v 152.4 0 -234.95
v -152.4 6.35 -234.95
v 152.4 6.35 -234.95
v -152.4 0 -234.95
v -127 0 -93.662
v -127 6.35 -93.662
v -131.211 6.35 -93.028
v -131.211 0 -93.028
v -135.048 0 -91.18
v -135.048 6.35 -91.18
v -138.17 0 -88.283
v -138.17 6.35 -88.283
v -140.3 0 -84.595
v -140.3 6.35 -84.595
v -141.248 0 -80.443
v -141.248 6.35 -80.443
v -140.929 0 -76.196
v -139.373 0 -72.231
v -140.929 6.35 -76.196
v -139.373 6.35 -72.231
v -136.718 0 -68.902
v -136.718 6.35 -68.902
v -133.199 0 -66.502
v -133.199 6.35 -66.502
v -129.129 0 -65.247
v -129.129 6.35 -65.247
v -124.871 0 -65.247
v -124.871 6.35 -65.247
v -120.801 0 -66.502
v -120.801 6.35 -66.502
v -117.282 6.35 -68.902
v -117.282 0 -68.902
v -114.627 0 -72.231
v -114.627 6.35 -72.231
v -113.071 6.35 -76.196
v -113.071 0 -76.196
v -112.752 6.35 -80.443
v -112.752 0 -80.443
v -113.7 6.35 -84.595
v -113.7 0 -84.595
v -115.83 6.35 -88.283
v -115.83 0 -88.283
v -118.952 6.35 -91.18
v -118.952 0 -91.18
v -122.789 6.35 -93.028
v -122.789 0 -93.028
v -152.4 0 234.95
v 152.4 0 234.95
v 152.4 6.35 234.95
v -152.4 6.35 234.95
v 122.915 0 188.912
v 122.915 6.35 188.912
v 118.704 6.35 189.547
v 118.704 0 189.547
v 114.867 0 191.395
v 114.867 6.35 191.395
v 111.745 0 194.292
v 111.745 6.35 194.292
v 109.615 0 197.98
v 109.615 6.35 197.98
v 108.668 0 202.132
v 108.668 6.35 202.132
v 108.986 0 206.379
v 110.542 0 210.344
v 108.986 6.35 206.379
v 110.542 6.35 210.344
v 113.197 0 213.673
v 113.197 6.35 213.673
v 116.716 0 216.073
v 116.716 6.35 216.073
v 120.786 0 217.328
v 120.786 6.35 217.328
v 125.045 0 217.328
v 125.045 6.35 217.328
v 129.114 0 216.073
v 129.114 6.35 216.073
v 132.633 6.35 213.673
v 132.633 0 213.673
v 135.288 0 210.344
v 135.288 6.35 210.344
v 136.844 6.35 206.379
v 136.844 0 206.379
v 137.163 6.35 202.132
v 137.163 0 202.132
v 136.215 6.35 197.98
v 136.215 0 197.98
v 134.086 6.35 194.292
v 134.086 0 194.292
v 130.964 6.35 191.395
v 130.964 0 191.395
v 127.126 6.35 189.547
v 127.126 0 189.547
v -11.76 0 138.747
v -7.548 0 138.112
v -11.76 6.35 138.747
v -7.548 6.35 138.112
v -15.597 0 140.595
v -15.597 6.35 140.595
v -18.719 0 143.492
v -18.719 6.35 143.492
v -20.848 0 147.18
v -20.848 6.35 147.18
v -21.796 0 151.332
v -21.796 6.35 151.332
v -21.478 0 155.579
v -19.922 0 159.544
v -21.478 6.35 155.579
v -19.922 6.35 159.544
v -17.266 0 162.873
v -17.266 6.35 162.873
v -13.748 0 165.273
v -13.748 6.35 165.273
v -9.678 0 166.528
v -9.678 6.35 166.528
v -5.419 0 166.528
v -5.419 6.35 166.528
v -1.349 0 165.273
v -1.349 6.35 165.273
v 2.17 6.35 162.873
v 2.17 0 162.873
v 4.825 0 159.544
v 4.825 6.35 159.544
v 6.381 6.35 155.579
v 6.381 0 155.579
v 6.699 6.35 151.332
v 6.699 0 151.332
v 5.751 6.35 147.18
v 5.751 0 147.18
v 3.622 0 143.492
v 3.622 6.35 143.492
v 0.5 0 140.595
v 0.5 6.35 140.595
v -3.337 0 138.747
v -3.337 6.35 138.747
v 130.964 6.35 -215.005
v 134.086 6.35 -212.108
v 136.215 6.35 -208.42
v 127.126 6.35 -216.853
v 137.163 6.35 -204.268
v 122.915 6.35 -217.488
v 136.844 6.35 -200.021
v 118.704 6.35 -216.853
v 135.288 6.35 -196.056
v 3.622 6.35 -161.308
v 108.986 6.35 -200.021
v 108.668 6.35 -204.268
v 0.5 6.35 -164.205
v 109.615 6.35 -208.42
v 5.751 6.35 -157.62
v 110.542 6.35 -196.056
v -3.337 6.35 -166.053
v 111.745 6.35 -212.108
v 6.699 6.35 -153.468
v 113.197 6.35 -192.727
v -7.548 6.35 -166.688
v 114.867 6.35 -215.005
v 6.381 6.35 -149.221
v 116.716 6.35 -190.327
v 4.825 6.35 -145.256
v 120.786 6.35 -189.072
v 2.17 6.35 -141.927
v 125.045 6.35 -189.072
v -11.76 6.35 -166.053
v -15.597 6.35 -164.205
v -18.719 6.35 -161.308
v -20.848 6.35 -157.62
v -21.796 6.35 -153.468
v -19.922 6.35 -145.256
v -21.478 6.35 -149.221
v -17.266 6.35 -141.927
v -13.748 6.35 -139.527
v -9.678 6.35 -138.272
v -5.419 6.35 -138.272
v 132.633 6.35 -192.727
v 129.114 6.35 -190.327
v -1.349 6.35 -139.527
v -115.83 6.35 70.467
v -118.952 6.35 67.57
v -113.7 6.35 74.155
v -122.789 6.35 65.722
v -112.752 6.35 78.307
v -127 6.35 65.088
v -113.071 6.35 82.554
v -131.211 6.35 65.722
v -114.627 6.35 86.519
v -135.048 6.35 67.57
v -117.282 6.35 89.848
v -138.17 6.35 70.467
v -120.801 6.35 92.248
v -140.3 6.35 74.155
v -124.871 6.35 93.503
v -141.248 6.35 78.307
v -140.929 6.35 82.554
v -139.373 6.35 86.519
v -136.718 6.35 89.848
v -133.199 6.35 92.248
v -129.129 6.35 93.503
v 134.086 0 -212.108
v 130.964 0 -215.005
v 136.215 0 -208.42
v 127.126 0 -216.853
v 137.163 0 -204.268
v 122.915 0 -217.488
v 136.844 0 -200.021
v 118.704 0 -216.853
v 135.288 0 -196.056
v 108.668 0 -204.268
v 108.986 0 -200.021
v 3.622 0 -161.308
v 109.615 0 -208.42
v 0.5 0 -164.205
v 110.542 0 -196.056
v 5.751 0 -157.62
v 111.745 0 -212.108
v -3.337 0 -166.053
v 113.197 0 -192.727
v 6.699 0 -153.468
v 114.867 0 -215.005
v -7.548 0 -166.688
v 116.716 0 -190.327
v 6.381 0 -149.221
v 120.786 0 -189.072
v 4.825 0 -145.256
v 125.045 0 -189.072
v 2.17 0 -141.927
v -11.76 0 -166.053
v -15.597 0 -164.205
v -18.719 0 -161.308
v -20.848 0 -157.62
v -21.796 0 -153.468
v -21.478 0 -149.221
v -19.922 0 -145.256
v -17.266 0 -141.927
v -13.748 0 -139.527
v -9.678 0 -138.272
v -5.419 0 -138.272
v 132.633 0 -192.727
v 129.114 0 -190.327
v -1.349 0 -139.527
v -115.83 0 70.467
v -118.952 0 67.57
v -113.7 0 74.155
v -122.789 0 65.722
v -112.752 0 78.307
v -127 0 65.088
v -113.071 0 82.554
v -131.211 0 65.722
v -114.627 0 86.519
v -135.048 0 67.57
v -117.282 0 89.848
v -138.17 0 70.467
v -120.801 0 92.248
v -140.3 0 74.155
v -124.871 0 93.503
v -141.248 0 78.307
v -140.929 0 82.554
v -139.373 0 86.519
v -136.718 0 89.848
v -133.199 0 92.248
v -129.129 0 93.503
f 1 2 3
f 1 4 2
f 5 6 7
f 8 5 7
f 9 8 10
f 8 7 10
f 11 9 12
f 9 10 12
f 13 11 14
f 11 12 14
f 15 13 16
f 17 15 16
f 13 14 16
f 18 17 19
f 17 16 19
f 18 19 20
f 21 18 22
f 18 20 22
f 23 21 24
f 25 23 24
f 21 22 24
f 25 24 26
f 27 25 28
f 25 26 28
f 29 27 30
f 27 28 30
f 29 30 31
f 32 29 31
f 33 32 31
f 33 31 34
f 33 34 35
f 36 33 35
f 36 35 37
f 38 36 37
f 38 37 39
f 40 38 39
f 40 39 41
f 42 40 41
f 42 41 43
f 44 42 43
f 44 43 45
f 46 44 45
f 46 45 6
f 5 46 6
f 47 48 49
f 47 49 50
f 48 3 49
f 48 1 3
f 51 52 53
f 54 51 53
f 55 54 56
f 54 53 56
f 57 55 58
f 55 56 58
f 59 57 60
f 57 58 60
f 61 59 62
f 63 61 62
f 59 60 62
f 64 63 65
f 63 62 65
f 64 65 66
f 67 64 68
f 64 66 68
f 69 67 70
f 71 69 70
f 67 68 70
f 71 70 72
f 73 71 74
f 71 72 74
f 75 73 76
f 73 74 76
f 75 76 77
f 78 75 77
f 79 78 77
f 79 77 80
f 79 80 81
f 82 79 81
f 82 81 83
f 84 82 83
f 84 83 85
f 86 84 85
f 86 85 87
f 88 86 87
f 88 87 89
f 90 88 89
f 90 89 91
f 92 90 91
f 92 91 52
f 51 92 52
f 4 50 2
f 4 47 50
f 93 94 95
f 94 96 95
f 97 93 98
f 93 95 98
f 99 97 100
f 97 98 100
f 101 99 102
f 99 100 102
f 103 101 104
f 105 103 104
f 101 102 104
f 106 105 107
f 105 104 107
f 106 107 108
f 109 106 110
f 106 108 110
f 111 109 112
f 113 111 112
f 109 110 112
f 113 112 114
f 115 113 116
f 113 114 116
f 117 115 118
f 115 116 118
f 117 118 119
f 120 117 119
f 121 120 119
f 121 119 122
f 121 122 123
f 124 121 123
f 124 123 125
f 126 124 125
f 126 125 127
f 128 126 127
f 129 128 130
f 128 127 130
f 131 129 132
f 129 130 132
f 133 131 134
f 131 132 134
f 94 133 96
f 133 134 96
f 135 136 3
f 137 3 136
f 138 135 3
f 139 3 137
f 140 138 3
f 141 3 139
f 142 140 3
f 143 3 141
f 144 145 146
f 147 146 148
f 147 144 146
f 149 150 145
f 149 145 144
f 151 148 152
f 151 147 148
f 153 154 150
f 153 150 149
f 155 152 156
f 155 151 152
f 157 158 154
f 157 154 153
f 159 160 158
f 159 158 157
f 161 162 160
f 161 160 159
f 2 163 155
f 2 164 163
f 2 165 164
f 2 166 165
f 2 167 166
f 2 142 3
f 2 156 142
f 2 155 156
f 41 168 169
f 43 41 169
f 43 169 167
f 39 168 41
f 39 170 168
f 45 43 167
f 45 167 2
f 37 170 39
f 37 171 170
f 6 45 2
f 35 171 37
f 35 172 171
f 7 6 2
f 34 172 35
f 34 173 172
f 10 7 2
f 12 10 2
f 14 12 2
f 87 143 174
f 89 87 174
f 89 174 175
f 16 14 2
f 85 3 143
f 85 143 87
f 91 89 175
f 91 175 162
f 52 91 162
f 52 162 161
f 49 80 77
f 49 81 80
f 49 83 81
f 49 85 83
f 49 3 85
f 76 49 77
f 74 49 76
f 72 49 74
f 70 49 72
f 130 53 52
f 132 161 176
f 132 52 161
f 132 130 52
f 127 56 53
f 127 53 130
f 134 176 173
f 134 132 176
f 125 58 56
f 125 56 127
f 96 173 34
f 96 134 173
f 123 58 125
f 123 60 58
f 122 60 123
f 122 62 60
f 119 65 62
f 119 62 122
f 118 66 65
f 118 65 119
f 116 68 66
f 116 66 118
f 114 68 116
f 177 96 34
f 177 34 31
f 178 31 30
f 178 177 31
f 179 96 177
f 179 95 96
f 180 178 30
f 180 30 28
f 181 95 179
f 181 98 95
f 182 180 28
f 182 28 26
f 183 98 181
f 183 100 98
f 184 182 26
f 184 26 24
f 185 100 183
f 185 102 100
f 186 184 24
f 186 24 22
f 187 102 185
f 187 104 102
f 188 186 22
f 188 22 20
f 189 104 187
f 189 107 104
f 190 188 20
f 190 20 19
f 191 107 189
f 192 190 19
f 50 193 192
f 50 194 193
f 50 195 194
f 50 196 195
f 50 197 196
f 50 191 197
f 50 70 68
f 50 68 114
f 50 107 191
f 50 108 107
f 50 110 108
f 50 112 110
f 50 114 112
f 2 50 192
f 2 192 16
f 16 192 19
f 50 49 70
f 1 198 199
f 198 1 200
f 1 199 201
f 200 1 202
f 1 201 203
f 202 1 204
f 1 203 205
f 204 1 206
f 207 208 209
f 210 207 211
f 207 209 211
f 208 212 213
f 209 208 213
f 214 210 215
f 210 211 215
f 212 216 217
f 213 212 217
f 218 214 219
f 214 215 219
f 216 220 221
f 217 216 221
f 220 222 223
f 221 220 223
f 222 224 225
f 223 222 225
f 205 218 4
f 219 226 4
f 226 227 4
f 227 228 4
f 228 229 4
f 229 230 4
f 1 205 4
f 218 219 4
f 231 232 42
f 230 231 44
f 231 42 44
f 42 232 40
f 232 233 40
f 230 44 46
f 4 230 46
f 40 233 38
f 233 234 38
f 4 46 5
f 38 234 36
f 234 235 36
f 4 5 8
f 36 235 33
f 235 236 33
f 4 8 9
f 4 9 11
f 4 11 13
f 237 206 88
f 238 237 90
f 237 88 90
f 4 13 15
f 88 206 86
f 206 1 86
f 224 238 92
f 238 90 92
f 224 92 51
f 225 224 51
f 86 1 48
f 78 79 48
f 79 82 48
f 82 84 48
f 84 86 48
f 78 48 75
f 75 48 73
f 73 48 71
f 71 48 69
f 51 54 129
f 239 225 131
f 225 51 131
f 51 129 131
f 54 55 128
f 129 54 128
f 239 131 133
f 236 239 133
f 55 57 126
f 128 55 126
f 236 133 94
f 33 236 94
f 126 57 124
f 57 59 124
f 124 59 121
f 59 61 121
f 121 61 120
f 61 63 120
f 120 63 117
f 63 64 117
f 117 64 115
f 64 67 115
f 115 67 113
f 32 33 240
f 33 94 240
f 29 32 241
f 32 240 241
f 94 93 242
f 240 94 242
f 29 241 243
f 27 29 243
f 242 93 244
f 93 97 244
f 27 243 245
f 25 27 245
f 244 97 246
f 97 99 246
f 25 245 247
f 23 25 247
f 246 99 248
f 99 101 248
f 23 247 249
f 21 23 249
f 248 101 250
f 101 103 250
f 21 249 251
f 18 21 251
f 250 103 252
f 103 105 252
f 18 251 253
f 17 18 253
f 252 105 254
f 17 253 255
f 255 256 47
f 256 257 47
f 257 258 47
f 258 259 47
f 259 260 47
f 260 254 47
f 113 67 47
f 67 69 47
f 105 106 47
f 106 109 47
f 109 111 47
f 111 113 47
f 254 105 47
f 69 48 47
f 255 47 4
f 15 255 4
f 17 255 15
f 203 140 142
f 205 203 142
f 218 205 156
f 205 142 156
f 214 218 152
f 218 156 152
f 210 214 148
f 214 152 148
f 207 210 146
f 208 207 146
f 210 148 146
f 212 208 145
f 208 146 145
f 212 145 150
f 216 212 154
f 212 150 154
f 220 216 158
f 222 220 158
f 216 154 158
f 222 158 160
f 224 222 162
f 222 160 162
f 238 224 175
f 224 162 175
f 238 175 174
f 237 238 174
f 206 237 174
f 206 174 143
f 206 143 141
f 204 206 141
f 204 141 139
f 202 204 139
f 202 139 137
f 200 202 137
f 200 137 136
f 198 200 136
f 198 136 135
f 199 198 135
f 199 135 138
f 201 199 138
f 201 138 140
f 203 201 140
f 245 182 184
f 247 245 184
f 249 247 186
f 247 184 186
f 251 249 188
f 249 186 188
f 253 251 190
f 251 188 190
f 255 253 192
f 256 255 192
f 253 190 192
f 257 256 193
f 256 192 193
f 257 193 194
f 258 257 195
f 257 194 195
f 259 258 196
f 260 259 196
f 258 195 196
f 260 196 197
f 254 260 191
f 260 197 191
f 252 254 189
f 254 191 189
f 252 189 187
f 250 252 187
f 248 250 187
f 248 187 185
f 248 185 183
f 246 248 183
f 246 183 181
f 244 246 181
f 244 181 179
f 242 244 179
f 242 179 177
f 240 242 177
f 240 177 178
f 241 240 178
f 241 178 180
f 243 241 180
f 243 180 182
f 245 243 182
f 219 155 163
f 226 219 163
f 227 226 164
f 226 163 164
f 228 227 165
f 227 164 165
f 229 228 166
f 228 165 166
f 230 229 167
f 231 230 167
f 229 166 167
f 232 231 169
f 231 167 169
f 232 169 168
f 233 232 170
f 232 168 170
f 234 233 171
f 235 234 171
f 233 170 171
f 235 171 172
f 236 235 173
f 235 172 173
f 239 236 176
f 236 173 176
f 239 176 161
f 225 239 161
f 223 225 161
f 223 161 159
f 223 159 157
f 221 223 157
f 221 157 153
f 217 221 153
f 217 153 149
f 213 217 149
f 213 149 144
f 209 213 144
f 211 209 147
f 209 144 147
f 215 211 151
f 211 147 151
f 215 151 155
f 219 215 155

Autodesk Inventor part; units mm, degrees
ref_plane "YZ Plane" through (0, 0, 0) normal (1, 0, 0) x (0, 1, 0)
ref_plane "XZ Plane" through (0, 0, 0) normal (0, 1, 0) x (-1, 0, 0)
ref_plane "XY Plane" through (0, 0, 0) normal (0, 0, 1) x (1, 0, 0)
sketch "Sketch1" plane through (0, 0, 0) normal (0, 1, 0) x (-1, 0, 0)
  line L0 (-152.4, 234.95) -> (152.4, 234.95)
  line L1 (152.4, 234.95) -> (152.4, -234.95)
  line L2 (152.4, -234.95) -> (-152.4, -234.95)
  line L3 (-152.4, -234.95) -> (-152.4, 234.95)
  line L4 (-152.4, 234.95) -> (152.4, -234.95) construction
  line L5 (152.4, 234.95) -> (-152.4, -234.95) construction
  circle A0 centre (127, -79.375) radius 25.4 construction
  circle A1 centre (127, 79.375) radius 25.4 construction
  circle A2 centre (7.5484, 152.4) radius 25.4 construction
  circle A3 centre (7.5484, -152.4) radius 25.4 construction
  circle A4 centre (-122.9151, -203.2) radius 25.4 construction
  circle A5 centre (-122.9151, 203.2) radius 25.4 construction
  point P0 (0, 0)
  dimension "d0" = 304.8
  dimension "d1" = 469.9
  dimension "d2" = 158.75
  dimension "d3" = 50.8
  dimension "d4" = 50.8
  dimension "d5" = 79.375
  dimension "d6" = 50.8
  dimension "d7" = 50.8
  dimension "d8" = 50.8
  dimension "d9" = 50.8
  dimension "d10" = 406.4
  dimension "d11" = 304.8
  dimension "d12" = 152.4
  dimension "d14" = 203.2
  dimension "d17" = 140.0048
  dimension "d18" = 140.0048
  dimension "d19" = 25.4
extrude "Extrusion1" add sketch "Sketch1" along normal blind 6.35
hole "Hole1" at (-127, 0, 79.375) at (-127, 0, -79.375) at (-7.5484, 0, 152.4) at (122.9151, 0, 203.2) at (-7.5484, 0, -152.4) at (122.9151, 0, -203.2) direction (0, 1, 0) diameter 28.575 end through all
equation "\"d3\" = d4"
equation "\"d5\" = 0.5 * d2"
equation "\"d6\" = d4"
equation "\"d7\" = d4"
equation "\"d8\" = d4"
equation "\"d9\" = d4"
equation "\"d12\" = 0.5 * d11"
equation "\"d14\" = 0.5 * d10"
properties part number "Int1-001" material "Aluminum 6061"
